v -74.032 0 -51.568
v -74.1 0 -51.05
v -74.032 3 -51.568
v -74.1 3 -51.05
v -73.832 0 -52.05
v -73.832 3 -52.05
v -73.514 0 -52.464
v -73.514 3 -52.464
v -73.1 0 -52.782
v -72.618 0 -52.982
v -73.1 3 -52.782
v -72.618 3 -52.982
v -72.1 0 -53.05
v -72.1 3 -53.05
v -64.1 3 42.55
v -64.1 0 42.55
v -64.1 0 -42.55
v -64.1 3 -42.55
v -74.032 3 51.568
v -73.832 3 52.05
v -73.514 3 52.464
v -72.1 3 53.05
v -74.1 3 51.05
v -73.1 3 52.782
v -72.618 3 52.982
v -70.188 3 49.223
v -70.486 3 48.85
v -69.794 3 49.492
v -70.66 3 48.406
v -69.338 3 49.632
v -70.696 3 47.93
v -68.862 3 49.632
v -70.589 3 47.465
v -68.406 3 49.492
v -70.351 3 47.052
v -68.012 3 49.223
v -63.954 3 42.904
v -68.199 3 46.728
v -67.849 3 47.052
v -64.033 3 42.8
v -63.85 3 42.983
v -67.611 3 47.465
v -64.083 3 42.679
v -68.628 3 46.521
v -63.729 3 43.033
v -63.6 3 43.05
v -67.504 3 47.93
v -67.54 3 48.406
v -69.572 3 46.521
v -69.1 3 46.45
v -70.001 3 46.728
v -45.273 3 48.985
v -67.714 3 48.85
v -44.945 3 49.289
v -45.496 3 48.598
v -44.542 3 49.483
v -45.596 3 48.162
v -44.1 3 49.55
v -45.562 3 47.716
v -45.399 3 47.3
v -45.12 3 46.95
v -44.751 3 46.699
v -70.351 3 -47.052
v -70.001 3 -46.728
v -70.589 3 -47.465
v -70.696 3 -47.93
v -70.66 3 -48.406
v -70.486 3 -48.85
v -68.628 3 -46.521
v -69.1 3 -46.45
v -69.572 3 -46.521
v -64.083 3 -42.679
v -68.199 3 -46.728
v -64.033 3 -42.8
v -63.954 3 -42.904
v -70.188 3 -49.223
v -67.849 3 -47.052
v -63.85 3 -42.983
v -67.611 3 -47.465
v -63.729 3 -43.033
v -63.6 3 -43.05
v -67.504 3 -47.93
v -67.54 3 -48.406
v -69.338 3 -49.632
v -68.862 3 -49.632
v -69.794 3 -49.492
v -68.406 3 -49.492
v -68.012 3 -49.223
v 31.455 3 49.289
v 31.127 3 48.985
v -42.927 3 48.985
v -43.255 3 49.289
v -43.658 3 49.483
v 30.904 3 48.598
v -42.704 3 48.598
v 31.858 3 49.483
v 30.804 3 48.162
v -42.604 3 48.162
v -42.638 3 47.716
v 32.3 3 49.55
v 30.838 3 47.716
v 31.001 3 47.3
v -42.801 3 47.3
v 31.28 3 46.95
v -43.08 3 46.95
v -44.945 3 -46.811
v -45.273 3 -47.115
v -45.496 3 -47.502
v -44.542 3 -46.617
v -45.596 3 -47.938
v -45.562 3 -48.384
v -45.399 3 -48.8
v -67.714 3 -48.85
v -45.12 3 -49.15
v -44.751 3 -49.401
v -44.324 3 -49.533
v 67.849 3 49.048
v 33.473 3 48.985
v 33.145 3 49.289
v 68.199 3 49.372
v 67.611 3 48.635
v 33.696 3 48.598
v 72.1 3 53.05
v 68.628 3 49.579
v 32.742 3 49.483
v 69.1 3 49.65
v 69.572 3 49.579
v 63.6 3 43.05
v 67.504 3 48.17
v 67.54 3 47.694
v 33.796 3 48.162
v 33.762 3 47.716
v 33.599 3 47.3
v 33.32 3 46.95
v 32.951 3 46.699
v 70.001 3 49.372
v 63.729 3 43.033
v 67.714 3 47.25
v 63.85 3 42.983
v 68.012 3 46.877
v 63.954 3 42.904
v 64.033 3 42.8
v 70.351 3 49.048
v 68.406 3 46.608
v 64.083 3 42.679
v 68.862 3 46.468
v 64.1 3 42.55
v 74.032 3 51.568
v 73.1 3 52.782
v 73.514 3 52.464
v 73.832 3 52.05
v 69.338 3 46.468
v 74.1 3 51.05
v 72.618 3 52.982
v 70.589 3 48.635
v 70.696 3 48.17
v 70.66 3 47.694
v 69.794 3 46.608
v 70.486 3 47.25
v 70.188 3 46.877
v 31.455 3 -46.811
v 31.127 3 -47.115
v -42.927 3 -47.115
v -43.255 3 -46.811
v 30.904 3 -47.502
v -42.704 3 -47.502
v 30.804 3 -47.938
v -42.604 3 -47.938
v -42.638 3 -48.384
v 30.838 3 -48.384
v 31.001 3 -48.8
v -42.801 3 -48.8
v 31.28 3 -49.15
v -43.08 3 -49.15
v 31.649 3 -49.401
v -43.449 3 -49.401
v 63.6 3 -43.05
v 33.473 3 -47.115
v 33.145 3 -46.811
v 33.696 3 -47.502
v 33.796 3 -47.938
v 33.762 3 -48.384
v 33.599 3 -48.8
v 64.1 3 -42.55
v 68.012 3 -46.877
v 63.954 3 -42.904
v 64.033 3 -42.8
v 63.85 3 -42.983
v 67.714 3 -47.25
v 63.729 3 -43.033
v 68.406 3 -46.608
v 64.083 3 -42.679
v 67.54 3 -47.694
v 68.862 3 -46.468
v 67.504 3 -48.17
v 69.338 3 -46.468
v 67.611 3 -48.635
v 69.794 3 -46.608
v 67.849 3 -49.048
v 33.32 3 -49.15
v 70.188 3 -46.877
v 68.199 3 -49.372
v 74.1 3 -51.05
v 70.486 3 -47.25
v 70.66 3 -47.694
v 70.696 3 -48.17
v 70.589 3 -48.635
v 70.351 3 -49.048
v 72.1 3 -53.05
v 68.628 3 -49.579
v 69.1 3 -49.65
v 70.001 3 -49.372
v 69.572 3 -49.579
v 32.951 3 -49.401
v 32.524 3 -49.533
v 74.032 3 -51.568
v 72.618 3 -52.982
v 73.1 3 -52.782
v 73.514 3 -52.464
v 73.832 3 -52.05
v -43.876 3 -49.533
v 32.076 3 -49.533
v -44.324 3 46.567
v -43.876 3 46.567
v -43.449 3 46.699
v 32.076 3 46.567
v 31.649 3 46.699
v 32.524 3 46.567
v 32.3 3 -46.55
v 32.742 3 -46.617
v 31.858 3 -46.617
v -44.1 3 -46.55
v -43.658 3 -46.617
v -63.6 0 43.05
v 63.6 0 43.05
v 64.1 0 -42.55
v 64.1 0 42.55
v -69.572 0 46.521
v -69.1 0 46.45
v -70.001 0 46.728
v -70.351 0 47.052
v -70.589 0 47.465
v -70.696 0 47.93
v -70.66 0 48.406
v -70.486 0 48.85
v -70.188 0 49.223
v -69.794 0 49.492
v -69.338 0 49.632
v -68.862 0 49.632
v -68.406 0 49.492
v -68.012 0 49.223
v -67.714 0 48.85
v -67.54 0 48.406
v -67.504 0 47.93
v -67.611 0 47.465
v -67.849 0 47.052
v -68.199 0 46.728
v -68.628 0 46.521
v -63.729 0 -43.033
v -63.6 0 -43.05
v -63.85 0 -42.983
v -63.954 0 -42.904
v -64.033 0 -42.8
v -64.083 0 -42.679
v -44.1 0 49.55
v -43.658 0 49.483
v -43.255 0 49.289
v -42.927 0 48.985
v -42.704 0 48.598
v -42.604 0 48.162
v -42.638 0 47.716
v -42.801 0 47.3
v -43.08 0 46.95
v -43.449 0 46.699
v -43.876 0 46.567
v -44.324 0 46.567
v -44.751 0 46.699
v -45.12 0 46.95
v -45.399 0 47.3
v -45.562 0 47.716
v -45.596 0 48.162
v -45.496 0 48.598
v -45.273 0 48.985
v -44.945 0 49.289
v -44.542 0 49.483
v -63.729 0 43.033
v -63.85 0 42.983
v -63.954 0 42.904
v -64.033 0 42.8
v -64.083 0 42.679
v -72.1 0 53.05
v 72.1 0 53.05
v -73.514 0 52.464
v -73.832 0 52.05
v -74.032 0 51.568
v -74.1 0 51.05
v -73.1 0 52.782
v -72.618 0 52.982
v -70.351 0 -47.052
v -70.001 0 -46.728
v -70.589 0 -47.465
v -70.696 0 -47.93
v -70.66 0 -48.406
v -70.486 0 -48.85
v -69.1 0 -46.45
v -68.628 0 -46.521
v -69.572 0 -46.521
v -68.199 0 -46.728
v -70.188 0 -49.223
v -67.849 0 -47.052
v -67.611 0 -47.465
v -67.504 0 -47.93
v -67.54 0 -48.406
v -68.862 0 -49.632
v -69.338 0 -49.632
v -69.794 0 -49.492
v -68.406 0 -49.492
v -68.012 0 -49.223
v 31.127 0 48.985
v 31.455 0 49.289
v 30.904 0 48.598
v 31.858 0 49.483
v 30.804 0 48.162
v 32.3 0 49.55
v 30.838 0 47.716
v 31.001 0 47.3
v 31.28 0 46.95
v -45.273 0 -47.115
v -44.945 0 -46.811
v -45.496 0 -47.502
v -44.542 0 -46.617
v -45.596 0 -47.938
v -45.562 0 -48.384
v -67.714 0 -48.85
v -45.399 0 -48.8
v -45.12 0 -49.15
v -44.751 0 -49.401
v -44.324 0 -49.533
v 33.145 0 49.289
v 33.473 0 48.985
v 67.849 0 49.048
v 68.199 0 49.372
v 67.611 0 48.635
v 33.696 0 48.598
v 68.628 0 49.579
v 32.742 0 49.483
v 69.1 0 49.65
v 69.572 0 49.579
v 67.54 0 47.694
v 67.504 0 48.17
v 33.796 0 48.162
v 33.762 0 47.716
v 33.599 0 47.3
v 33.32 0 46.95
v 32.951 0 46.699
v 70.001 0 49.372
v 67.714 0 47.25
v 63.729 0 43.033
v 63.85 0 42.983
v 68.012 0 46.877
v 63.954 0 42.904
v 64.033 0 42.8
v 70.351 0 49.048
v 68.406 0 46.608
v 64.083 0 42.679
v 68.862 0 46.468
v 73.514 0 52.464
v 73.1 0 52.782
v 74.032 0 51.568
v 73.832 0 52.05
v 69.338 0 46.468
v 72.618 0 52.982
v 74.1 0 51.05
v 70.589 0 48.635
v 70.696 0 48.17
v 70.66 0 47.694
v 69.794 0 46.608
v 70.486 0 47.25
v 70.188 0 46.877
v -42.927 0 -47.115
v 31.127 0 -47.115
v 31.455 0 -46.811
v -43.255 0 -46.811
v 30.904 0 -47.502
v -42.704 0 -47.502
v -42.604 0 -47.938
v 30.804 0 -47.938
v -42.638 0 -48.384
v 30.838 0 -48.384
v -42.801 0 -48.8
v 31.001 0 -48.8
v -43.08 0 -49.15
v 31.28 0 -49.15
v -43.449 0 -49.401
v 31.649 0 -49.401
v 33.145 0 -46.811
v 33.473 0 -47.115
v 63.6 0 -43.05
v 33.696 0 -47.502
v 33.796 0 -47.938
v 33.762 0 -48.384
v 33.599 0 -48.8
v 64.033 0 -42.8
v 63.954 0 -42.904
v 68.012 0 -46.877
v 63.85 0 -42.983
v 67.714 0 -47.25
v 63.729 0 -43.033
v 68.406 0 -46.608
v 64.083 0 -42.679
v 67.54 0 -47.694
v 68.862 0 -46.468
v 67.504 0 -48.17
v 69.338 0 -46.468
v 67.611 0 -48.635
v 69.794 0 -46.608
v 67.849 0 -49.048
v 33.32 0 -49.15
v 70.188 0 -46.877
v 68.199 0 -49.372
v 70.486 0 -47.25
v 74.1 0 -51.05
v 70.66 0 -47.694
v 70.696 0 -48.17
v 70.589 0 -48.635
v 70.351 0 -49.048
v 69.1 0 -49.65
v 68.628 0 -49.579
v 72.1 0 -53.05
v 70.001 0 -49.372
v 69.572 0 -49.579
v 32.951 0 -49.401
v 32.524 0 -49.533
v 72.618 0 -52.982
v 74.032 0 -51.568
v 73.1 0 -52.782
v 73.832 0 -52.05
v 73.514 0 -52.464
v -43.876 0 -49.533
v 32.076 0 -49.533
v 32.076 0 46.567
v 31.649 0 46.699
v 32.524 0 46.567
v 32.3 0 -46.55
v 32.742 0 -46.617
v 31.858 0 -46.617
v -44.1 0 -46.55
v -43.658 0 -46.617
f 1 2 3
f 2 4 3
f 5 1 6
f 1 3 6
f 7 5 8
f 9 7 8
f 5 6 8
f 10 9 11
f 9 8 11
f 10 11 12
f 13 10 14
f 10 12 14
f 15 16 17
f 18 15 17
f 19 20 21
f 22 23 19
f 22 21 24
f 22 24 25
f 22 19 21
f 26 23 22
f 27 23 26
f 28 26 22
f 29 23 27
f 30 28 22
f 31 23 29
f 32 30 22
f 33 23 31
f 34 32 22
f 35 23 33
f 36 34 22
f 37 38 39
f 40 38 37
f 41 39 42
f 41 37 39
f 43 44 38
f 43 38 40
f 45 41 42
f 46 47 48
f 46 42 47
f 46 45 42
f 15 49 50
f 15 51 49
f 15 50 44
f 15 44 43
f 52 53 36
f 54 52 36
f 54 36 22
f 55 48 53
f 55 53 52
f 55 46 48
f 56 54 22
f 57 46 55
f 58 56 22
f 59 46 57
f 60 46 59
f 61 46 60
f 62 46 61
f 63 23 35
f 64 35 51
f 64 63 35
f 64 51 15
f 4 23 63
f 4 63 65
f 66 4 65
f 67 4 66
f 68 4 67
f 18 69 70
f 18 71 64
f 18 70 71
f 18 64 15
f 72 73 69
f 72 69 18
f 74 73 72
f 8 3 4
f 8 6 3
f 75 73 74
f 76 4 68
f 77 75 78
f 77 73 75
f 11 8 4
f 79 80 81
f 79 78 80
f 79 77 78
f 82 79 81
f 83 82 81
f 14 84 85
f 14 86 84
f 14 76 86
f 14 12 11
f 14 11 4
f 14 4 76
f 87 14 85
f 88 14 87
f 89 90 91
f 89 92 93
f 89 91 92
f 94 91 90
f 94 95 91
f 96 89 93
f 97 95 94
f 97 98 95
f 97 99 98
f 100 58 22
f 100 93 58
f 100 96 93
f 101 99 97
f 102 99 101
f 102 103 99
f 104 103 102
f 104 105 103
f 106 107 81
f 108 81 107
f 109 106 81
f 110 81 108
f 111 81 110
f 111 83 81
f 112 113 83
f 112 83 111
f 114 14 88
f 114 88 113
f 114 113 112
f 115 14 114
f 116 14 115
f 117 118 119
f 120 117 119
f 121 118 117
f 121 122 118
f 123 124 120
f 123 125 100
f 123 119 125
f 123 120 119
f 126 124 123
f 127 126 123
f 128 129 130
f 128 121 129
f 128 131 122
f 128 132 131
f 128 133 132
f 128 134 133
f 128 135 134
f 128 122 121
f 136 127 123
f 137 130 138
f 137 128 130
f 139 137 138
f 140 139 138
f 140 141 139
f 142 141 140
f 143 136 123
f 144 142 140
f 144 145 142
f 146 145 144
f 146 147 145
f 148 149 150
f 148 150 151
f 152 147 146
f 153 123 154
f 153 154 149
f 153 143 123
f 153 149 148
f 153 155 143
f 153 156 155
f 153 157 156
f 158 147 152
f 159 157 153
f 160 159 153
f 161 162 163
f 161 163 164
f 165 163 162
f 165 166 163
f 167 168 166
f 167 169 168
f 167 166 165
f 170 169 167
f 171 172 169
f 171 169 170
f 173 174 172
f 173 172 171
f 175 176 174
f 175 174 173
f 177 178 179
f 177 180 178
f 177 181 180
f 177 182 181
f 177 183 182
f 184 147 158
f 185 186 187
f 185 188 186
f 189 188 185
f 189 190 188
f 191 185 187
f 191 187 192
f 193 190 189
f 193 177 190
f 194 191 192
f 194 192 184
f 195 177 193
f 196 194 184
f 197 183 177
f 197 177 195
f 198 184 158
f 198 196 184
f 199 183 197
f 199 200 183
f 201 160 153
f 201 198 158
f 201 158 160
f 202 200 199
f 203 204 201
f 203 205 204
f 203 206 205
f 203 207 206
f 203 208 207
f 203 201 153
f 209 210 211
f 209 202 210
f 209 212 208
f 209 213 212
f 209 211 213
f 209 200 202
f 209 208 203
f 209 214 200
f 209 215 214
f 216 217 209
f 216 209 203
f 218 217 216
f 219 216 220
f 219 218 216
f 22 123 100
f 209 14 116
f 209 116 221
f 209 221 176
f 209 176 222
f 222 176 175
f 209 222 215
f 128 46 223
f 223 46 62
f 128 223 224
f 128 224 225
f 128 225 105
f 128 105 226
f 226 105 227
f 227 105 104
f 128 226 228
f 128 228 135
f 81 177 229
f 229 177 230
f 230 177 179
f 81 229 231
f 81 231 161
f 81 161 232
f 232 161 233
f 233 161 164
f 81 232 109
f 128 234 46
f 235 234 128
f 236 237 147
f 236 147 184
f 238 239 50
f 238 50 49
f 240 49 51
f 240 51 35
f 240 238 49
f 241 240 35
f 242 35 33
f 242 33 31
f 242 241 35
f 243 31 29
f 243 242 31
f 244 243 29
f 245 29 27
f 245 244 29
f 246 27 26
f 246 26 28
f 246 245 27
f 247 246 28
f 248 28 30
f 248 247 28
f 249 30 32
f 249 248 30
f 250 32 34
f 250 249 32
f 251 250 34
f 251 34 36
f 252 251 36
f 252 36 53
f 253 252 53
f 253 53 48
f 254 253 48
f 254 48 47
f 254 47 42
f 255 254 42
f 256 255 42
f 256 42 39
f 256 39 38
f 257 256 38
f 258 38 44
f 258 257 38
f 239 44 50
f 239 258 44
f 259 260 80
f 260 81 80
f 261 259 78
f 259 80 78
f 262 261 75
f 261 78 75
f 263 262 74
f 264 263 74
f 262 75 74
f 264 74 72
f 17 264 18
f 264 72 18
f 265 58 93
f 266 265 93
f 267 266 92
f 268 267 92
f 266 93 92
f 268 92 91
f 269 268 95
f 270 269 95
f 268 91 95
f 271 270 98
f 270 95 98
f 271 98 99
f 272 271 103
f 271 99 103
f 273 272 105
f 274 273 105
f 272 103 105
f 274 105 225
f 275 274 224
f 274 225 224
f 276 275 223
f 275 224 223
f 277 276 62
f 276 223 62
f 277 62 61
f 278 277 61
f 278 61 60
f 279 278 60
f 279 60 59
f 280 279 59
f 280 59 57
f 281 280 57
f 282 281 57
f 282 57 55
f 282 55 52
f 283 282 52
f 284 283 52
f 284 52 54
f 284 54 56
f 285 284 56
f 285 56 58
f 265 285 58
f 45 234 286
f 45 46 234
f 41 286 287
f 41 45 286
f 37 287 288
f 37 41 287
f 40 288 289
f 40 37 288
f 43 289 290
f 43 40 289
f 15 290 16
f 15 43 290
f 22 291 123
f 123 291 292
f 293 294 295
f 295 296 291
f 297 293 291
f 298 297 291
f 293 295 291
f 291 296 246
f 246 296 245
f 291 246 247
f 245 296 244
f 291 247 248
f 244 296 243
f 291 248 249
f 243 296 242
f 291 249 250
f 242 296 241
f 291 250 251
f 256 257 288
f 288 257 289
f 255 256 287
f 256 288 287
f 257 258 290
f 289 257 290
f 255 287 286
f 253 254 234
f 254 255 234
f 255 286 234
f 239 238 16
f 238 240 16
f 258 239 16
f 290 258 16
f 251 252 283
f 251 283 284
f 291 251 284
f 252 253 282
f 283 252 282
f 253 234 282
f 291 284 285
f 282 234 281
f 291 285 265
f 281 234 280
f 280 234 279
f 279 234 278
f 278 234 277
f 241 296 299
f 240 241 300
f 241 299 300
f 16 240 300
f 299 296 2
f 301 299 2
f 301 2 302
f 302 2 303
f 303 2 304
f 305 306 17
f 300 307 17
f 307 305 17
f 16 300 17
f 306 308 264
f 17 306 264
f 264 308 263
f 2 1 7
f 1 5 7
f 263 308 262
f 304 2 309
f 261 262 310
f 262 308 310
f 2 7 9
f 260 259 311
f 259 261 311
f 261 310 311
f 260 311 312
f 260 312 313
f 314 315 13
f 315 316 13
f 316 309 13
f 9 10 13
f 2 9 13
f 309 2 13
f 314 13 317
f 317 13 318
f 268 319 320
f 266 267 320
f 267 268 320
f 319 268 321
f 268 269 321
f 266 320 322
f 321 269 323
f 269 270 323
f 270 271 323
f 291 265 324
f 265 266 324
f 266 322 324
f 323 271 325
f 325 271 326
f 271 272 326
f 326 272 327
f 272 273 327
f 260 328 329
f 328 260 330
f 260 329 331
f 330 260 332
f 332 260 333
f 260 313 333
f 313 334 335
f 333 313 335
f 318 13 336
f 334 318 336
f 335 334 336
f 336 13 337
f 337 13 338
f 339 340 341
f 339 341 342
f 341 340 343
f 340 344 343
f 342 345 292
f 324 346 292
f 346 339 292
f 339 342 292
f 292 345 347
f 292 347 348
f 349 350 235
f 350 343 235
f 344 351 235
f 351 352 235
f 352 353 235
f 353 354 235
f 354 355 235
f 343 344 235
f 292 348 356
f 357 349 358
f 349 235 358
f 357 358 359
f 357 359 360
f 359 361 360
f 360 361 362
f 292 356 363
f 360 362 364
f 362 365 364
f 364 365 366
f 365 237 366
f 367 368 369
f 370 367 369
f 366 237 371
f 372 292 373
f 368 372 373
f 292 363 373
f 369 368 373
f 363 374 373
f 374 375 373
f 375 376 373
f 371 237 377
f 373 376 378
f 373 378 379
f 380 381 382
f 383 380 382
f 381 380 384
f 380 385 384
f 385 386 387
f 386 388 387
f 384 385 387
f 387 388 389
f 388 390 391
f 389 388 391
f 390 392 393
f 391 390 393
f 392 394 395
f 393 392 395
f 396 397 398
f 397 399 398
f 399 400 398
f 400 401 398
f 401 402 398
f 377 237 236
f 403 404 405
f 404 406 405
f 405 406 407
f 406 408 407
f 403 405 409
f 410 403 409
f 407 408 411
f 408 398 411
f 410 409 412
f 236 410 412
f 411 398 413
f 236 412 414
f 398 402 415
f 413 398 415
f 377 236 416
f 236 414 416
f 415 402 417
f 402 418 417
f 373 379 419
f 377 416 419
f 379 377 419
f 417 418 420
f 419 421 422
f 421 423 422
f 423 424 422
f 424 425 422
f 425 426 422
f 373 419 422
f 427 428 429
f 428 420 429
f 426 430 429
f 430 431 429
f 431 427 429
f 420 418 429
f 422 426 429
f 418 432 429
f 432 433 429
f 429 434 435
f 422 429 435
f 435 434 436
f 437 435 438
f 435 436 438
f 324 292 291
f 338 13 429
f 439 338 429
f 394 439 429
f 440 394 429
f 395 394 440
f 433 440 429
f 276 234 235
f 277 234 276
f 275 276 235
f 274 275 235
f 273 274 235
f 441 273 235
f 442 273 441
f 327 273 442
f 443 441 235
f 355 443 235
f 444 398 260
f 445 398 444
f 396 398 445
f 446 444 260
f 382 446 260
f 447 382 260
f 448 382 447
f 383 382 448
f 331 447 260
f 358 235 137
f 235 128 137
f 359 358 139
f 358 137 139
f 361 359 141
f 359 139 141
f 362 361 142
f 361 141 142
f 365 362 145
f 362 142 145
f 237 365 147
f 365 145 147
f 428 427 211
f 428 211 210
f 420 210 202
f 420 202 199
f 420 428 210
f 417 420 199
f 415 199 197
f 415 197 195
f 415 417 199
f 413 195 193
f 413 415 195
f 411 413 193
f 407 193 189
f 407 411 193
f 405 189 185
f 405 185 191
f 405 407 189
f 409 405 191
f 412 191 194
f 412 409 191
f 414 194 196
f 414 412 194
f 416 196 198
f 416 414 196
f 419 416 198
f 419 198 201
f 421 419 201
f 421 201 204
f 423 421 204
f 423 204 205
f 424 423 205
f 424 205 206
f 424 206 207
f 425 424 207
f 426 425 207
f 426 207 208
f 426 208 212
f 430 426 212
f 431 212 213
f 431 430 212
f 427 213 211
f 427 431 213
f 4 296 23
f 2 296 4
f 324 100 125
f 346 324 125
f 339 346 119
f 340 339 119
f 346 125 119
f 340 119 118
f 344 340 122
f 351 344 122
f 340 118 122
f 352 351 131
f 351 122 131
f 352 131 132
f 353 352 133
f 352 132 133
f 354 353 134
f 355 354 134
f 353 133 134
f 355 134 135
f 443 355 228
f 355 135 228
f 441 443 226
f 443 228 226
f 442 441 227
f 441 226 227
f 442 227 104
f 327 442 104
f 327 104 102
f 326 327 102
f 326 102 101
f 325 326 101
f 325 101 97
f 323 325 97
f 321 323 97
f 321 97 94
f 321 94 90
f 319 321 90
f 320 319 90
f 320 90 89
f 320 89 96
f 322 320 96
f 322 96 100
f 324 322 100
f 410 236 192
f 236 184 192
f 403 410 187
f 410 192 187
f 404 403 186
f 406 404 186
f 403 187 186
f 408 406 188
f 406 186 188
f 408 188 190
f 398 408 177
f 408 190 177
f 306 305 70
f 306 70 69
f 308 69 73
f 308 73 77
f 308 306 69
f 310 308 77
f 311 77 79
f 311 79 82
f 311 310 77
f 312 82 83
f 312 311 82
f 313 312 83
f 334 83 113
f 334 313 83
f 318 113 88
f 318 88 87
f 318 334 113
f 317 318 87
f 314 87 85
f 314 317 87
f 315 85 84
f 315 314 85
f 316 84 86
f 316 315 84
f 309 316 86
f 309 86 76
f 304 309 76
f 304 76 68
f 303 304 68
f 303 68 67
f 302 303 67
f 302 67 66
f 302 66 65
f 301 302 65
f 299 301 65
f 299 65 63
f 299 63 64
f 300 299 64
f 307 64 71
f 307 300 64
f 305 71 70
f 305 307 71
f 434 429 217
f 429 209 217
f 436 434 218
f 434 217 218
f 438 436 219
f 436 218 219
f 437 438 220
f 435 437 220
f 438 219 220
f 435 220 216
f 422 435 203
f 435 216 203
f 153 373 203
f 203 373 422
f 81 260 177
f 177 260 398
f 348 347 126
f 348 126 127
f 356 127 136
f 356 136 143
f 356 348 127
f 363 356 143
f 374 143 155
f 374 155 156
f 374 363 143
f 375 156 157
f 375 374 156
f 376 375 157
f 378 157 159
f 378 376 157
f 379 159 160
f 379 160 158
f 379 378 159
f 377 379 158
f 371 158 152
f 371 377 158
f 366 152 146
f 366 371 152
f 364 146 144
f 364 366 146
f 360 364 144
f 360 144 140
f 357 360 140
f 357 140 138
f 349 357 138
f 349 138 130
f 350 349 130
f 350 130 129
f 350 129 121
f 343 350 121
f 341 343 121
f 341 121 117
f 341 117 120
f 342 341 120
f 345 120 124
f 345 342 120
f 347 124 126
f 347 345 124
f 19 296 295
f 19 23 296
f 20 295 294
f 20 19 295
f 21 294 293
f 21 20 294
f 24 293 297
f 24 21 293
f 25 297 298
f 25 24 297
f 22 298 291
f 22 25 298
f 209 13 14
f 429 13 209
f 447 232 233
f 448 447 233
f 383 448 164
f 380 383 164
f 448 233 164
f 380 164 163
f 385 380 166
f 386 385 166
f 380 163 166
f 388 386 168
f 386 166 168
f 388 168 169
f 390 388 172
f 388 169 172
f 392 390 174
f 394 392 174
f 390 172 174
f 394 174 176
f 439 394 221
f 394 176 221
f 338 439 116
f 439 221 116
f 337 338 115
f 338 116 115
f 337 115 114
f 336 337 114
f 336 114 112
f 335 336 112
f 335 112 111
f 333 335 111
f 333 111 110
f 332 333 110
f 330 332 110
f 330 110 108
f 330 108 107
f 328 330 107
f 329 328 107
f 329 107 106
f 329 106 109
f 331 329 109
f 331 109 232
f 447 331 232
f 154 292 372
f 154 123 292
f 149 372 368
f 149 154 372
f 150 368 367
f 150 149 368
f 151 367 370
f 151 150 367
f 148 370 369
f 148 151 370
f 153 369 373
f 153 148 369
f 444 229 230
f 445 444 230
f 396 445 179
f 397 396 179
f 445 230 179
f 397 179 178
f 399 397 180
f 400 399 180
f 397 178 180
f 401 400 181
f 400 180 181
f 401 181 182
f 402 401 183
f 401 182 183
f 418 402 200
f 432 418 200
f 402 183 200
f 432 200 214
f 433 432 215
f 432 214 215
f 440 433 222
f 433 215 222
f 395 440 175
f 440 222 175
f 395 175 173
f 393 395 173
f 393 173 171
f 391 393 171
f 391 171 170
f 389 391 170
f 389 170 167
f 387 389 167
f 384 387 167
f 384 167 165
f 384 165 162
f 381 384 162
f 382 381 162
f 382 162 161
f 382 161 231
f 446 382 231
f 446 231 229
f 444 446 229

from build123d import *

# Parameters (mm, degrees)
SKETCH1_W           = 148.2
SKETCH1_H           = 106.1
SKETCH1_R           = 1.6
SKETCH1_W_2         = 128.2
SKETCH1_H_2         = 86.1
BOSS_EXTRUDE1_DEPTH = 3
FILLET1_R           = 2
FILLET2_R           = 0.5
CUT_EXTRUDE3_REACH  = 93.182
SKETCH4_R           = 1.5


with BuildPart() as part:
    # Sketch1 → Boss-Extrude1 (new body)
    with BuildSketch(Plane(origin=(0, 0, 0), x_dir=(1, 0, 0), z_dir=(0, 1, 0))):
        Rectangle(SKETCH1_W, SKETCH1_H)
        with Locations(Location((-69.1, 48.05, 0), (0, 0, 270))):
            Circle(SKETCH1_R, mode=Mode.SUBTRACT)
        with Locations(Location((-69.1, -48.05, 0), (0, 0, 90))):
            Circle(SKETCH1_R, mode=Mode.SUBTRACT)
        with Locations(Location((69.1, 48.05, 0), (0, 0, 90))):
            Circle(SKETCH1_R, mode=Mode.SUBTRACT)
        with Locations(Location((69.1, -48.05, 0), (0, 0, 270))):
            Circle(SKETCH1_R, mode=Mode.SUBTRACT)
        Rectangle(SKETCH1_W_2, SKETCH1_H_2, mode=Mode.SUBTRACT)
    extrude(amount=BOSS_EXTRUDE1_DEPTH)

    # Fillet1
    fillet1_edges = [part.edges().sort_by_distance(p)[0] for p in [
        (-74.1, 1.5, -53.05),
        (74.1, 1.5, -53.05),
        (74.1, 1.5, 53.05),
        (-74.1, 1.5, 53.05),
    ]]
    fillet(fillet1_edges, radius=FILLET1_R)

    # Fillet2
    fillet2_edges = [part.edges().sort_by_distance(p)[0] for p in [
        (64.1, 1.5, 43.05),
        (64.1, 1.5, -43.05),
        (-64.1, 1.5, -43.05),
        (-64.1, 1.5, 43.05),
    ]]
    fillet(fillet2_edges, radius=FILLET2_R)

    # Sketch4 → Cut-Extrude3 (cut, up to next)
    with BuildSketch(Plane(origin=(0, 3, 0), x_dir=(-1, 0, 0), z_dir=(0, 1, 0)), mode=Mode.PRIVATE) as cut_extrude3_sk1:
        with Locations(Location((-32.3, -48.05, 0), (0, 0, 90))):
            Circle(SKETCH4_R)
    cut_extrude3_tool1 = extrude(cut_extrude3_sk1.sketch, amount=-CUT_EXTRUDE3_REACH, mode=Mode.PRIVATE) & part.part
    # Sketch4 → Cut-Extrude3 (cut, up to next)
    with BuildSketch(Plane(origin=(0, 3, 0), x_dir=(-1, 0, 0), z_dir=(0, 1, 0)), mode=Mode.PRIVATE) as cut_extrude3_sk2:
        with Locations(Location((44.1, -48.05, 0), (0, 0, 90))):
            Circle(SKETCH4_R)
    cut_extrude3_tool2 = extrude(cut_extrude3_sk2.sketch, amount=-CUT_EXTRUDE3_REACH, mode=Mode.PRIVATE) & part.part
    # Sketch4 → Cut-Extrude3 (cut, up to next)
    with BuildSketch(Plane(origin=(0, 3, 0), x_dir=(-1, 0, 0), z_dir=(0, 1, 0)), mode=Mode.PRIVATE) as cut_extrude3_sk3:
        with Locations(Location((44.1, 48.05, 0), (0, 0, 90))):
            Circle(SKETCH4_R)
    cut_extrude3_tool3 = extrude(cut_extrude3_sk3.sketch, amount=-CUT_EXTRUDE3_REACH, mode=Mode.PRIVATE) & part.part
    # Sketch4 → Cut-Extrude3 (cut, up to next)
    with BuildSketch(Plane(origin=(0, 3, 0), x_dir=(-1, 0, 0), z_dir=(0, 1, 0)), mode=Mode.PRIVATE) as cut_extrude3_sk4:
        with Locations(Location((-32.3, 48.05, 0), (0, 0, 90))):
            Circle(SKETCH4_R)
    cut_extrude3_tool4 = extrude(cut_extrude3_sk4.sketch, amount=-CUT_EXTRUDE3_REACH, mode=Mode.PRIVATE) & part.part
    add(cut_extrude3_tool1.solids().sort_by_distance((32.3, 3, -48.05))[0], mode=Mode.SUBTRACT)
    add(cut_extrude3_tool2.solids().sort_by_distance((-44.1, 3, -48.05))[0], mode=Mode.SUBTRACT)
    add(cut_extrude3_tool3.solids().sort_by_distance((-44.1, 3, 48.05))[0], mode=Mode.SUBTRACT)
    add(cut_extrude3_tool4.solids().sort_by_distance((32.3, 3, 48.05))[0], mode=Mode.SUBTRACT)


solid = part.part
